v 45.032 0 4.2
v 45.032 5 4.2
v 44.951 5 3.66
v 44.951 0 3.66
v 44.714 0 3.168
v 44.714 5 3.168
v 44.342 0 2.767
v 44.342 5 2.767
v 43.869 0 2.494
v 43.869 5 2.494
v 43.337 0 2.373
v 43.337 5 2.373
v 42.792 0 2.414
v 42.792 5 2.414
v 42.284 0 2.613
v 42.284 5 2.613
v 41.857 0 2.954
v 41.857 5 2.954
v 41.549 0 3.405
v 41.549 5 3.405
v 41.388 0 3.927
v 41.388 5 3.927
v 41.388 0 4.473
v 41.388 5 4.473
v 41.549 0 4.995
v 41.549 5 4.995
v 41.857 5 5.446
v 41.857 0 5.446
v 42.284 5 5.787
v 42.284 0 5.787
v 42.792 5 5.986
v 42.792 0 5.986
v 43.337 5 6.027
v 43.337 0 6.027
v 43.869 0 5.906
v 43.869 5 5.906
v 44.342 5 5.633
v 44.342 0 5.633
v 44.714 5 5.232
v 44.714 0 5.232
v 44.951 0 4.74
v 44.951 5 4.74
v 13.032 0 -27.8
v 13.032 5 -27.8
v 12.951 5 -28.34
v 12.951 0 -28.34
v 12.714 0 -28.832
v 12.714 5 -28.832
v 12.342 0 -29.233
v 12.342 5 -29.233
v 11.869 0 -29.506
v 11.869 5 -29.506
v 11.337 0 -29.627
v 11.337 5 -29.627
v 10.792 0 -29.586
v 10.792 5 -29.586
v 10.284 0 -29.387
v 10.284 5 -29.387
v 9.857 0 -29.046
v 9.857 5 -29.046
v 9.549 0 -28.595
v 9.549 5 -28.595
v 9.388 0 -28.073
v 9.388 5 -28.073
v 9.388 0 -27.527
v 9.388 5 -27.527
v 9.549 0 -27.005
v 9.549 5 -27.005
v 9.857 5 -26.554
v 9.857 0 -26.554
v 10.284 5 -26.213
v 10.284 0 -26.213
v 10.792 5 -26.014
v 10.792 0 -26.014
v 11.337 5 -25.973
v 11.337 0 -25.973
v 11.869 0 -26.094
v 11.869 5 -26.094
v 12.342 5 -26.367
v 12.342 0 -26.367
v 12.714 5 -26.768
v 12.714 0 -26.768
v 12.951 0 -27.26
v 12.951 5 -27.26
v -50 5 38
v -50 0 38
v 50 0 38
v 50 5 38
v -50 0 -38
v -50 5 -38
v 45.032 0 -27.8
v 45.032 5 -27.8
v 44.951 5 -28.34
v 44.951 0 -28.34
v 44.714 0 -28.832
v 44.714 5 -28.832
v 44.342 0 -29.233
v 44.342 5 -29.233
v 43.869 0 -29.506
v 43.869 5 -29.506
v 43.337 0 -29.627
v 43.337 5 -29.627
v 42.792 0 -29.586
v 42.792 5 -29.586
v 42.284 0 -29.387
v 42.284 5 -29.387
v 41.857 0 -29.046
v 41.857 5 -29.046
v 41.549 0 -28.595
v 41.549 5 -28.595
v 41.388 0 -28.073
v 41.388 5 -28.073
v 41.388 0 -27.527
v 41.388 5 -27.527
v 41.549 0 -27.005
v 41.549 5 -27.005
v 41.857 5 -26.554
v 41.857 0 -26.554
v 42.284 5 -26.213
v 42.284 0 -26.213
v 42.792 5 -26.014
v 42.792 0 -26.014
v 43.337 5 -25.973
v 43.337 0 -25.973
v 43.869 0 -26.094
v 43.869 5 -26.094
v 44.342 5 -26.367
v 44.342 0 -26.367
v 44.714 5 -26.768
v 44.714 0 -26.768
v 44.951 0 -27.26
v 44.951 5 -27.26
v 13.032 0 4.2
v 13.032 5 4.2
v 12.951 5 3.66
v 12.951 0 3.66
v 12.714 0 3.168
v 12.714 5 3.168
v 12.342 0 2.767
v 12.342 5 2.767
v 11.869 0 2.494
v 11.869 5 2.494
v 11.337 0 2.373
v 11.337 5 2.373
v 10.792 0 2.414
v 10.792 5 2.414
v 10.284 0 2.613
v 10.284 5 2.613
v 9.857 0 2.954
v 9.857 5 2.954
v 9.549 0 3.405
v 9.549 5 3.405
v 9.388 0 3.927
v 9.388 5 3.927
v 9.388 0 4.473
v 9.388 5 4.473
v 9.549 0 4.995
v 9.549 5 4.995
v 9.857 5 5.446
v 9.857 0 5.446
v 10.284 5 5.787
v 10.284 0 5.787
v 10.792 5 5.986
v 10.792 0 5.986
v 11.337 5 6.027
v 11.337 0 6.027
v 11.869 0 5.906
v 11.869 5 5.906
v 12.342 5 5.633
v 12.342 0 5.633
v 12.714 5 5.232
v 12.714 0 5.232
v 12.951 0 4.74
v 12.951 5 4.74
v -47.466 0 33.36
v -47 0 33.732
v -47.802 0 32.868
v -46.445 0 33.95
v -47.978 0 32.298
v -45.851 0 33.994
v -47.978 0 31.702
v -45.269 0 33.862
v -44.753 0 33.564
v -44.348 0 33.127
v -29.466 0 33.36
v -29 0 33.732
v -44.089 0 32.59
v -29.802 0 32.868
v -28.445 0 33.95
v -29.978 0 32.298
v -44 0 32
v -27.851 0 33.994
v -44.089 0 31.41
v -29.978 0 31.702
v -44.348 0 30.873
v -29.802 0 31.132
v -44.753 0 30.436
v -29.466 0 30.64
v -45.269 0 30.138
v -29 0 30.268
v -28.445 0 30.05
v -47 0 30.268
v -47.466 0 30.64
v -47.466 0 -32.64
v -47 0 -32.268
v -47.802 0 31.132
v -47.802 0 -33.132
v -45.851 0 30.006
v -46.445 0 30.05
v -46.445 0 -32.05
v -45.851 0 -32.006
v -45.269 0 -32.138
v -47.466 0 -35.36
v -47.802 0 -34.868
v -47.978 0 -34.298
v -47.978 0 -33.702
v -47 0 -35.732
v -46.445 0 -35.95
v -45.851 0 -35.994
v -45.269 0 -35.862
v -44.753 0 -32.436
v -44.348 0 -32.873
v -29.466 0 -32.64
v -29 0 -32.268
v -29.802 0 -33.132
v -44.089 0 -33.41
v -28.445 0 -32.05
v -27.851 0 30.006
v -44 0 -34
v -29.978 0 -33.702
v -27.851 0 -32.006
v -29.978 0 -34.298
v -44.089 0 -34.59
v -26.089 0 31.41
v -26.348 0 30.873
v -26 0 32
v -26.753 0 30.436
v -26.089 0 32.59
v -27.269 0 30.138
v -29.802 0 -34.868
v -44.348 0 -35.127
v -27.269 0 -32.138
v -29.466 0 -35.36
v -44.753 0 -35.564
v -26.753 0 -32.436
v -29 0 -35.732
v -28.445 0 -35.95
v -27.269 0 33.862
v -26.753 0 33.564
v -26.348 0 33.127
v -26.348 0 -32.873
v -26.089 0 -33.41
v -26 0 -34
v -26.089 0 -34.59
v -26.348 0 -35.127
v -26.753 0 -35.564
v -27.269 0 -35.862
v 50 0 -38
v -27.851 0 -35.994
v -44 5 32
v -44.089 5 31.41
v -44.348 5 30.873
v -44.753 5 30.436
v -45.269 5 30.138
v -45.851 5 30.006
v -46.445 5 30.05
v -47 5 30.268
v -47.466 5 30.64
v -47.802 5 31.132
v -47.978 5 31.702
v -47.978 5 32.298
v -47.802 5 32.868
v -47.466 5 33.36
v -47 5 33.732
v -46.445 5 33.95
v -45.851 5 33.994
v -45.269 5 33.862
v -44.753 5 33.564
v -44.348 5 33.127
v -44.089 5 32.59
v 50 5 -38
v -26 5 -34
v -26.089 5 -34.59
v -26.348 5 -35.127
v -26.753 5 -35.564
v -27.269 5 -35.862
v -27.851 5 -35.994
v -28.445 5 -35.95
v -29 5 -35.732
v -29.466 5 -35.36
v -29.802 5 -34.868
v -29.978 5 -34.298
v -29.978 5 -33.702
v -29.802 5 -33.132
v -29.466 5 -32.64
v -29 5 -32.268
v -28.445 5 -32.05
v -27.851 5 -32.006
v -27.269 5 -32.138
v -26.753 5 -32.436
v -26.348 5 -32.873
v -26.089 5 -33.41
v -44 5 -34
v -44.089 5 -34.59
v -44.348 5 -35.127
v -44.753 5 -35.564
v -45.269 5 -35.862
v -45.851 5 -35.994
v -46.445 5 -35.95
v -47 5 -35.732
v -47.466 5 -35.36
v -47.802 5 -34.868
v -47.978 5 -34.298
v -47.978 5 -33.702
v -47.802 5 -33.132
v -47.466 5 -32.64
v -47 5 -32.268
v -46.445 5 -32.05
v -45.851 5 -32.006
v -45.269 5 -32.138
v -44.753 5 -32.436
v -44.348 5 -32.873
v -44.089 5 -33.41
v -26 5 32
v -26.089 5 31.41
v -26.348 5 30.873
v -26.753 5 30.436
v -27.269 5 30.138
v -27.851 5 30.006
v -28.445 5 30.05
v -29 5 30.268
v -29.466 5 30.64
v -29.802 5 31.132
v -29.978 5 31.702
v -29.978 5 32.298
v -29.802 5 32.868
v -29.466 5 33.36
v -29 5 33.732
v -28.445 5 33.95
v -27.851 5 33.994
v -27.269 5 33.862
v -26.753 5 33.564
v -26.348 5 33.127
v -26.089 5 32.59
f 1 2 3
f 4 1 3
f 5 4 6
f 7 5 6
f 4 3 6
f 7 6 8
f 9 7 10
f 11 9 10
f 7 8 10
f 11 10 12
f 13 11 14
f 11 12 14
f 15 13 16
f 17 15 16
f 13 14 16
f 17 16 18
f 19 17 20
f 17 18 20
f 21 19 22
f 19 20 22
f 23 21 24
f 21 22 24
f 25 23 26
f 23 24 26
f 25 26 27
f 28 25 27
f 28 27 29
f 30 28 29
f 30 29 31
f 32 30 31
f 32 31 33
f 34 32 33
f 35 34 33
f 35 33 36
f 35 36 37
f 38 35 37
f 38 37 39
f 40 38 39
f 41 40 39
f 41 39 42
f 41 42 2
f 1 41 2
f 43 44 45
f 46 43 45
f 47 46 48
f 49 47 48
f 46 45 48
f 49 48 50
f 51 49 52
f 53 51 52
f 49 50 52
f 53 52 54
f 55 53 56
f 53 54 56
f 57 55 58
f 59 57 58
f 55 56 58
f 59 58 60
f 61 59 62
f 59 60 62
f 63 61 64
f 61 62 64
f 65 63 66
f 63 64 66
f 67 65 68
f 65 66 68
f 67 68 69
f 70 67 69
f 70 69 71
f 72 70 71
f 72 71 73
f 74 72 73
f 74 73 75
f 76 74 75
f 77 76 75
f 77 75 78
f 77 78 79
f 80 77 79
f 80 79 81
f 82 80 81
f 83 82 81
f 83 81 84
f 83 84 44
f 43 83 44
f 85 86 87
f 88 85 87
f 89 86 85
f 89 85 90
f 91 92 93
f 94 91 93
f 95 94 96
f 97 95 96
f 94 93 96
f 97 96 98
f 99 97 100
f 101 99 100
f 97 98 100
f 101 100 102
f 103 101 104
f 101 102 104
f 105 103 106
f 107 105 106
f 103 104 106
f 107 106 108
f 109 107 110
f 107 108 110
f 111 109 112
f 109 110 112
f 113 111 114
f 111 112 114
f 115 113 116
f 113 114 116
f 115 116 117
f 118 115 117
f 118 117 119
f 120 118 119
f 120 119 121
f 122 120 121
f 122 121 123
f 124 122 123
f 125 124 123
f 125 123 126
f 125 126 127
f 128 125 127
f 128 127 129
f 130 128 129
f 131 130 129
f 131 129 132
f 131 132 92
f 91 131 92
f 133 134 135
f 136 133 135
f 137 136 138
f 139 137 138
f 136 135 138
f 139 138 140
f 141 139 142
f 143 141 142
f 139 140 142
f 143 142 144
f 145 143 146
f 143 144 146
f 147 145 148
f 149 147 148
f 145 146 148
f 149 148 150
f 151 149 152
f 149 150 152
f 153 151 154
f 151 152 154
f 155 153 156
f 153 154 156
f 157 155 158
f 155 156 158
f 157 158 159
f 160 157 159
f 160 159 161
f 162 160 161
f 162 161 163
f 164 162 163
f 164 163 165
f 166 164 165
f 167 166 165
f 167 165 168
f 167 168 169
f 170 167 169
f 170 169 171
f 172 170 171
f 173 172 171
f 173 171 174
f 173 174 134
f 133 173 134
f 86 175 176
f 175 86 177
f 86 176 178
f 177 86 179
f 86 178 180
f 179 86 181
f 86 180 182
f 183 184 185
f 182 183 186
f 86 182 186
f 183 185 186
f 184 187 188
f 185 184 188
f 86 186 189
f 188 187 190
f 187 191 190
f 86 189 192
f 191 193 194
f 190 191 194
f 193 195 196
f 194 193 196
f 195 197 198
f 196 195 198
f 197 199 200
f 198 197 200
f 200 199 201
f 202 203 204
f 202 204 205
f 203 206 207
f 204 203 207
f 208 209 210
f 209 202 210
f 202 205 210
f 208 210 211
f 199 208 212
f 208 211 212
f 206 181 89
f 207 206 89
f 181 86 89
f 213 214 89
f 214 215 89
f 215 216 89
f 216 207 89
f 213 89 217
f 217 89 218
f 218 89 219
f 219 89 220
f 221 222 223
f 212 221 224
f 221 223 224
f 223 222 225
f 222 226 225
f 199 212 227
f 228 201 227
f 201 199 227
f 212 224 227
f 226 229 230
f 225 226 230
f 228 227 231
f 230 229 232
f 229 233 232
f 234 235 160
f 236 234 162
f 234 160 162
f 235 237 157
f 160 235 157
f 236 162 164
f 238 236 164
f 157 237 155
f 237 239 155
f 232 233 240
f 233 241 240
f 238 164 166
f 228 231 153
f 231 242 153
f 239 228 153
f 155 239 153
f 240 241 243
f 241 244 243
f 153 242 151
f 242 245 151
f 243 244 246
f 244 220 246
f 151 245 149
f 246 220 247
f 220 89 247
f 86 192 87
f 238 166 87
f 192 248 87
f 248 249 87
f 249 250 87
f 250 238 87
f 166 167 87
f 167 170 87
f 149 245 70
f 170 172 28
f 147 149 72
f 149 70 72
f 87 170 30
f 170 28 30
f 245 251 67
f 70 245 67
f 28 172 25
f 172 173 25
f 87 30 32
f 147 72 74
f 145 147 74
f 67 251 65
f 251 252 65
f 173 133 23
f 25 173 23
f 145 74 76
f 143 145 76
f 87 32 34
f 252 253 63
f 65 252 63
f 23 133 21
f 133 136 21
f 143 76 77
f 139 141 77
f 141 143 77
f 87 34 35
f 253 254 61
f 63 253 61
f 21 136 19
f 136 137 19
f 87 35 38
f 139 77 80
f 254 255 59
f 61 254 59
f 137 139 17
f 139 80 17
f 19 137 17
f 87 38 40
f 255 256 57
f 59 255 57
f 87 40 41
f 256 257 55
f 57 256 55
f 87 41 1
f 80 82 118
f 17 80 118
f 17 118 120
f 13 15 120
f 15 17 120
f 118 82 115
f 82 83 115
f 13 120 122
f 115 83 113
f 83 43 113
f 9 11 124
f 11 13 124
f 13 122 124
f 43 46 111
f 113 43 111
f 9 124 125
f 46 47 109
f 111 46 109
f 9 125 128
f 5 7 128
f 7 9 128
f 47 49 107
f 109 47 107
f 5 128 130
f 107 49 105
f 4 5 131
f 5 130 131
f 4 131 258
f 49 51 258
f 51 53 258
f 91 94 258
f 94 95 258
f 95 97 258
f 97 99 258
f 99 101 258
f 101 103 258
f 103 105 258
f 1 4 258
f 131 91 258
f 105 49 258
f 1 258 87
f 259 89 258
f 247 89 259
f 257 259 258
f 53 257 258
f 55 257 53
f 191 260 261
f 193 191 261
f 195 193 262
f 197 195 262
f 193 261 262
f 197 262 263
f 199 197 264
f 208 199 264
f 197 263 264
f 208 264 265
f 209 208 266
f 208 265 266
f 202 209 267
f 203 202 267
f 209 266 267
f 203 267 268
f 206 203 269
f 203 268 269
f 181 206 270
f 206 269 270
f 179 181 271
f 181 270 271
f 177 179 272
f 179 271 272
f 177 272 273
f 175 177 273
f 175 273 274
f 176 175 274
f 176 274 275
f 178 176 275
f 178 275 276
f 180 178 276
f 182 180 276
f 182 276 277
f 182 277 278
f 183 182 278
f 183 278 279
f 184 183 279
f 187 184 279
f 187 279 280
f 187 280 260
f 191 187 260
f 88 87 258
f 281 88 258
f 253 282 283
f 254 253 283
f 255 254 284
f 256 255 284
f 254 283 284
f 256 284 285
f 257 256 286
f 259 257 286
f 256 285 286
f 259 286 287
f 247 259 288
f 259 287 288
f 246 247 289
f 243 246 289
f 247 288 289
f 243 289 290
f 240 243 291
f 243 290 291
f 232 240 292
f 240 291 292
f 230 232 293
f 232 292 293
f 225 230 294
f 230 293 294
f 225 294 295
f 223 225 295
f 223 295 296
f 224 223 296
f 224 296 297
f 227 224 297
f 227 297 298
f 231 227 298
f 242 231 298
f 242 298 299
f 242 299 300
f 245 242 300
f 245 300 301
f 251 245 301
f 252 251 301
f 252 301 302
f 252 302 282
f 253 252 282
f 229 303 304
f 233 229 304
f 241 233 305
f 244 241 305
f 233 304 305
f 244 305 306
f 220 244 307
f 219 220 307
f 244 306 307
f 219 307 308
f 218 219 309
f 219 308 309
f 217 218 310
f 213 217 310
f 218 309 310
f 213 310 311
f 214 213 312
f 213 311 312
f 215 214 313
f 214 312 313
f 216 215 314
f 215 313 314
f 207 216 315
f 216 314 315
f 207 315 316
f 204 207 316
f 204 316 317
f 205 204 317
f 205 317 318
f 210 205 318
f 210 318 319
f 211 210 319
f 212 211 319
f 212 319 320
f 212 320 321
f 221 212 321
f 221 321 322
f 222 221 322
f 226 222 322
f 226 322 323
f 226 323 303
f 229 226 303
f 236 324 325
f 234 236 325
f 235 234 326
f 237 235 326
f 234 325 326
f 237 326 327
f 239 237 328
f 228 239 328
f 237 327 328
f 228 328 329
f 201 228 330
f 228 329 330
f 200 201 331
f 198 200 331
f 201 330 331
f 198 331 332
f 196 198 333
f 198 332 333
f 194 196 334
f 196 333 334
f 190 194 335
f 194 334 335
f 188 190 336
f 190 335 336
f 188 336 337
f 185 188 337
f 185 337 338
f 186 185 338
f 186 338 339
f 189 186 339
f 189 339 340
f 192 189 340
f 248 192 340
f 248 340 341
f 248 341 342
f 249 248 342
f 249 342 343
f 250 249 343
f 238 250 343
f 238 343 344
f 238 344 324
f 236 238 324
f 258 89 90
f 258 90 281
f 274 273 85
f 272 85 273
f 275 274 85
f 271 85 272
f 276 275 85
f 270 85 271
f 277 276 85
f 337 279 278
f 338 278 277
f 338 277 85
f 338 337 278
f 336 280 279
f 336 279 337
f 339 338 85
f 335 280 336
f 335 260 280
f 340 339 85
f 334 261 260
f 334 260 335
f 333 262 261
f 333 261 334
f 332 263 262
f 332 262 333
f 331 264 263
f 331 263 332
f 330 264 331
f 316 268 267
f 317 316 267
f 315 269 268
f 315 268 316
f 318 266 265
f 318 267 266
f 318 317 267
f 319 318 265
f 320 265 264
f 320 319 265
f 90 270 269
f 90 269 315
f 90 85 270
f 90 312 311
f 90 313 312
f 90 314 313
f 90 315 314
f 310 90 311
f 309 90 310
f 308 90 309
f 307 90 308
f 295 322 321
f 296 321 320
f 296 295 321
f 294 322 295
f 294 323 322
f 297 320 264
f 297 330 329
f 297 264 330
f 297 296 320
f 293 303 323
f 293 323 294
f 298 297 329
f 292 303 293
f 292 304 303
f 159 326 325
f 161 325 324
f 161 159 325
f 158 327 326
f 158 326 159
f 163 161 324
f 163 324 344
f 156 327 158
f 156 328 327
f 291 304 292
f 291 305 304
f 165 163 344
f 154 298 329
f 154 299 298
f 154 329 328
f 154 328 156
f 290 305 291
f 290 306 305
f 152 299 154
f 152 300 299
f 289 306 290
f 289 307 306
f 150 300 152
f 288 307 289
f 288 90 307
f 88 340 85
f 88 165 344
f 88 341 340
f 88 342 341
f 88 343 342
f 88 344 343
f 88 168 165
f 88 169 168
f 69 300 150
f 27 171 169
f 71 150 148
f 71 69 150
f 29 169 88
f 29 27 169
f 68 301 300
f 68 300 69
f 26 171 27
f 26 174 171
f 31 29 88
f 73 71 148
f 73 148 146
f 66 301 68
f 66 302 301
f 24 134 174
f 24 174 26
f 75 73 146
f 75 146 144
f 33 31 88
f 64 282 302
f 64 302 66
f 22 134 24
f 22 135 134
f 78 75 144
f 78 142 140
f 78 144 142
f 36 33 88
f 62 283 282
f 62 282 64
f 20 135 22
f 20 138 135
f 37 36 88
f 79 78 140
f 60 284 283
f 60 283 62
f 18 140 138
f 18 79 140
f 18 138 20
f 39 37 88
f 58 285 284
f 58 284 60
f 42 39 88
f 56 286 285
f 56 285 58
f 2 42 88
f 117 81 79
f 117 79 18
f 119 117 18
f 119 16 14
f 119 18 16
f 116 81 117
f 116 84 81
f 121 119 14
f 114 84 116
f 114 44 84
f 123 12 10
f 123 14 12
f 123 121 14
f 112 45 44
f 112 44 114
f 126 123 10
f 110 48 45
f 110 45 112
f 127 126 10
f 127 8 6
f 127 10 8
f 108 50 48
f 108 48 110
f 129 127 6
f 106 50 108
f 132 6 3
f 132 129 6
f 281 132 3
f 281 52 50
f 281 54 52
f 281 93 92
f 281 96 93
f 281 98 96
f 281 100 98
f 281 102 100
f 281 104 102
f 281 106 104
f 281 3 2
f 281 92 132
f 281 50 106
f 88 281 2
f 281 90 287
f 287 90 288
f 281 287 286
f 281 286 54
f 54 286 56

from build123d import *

# Parameters (mm, degrees)
SKETCH1_W           = 100
SKETCH1_H           = 76
BOSS_EXTRUDE1_DEPTH = 5
CUT_EXTRUDE6_REACH  = 7
SKETCH2_R           = 2
SKETCH2_R_2         = 1.832419899


with BuildPart() as part:
    # Sketch1 → Boss-Extrude1 (new body)
    with BuildSketch(Plane(origin=(0, 0, 0), x_dir=(1, 0, 0), z_dir=(0, 1, 0))):
        Rectangle(SKETCH1_W, SKETCH1_H)
    extrude(amount=BOSS_EXTRUDE1_DEPTH)

    # Sketch2 → Cut-Extrude6 (cut, up to next)
    with BuildSketch(Plane(origin=(0, 5, 0), x_dir=(1, 0, 0), z_dir=(0, 1, 0)), mode=Mode.PRIVATE) as cut_extrude6_sk1:
        with Locations((-46, 34)):
            Circle(SKETCH2_R)
    cut_extrude6_tool1 = extrude(cut_extrude6_sk1.sketch, amount=-CUT_EXTRUDE6_REACH, mode=Mode.PRIVATE) & part.part
    add(cut_extrude6_tool1.solids().sort_by_distance((-46, 5, -34))[0], mode=Mode.SUBTRACT)
    # Sketch2 → Cut-Extrude6 (cut, up to next)
    with BuildSketch(Plane(origin=(0, 5, 0), x_dir=(1, 0, 0), z_dir=(0, 1, 0)), mode=Mode.PRIVATE) as cut_extrude6_sk2:
        with Locations((-28, 34)):
            Circle(SKETCH2_R)
    cut_extrude6_tool2 = extrude(cut_extrude6_sk2.sketch, amount=-CUT_EXTRUDE6_REACH, mode=Mode.PRIVATE) & part.part
    add(cut_extrude6_tool2.solids().sort_by_distance((-28, 5, -34))[0], mode=Mode.SUBTRACT)
    # Sketch2 → Cut-Extrude6 (cut, up to next)
    with BuildSketch(Plane(origin=(0, 5, 0), x_dir=(1, 0, 0), z_dir=(0, 1, 0)), mode=Mode.PRIVATE) as cut_extrude6_sk3:
        with Locations((-46, -32)):
            Circle(SKETCH2_R)
    cut_extrude6_tool3 = extrude(cut_extrude6_sk3.sketch, amount=-CUT_EXTRUDE6_REACH, mode=Mode.PRIVATE) & part.part
    add(cut_extrude6_tool3.solids().sort_by_distance((-46, 5, 32))[0], mode=Mode.SUBTRACT)
    # Sketch2 → Cut-Extrude6 (cut, up to next)
    with BuildSketch(Plane(origin=(0, 5, 0), x_dir=(1, 0, 0), z_dir=(0, 1, 0)), mode=Mode.PRIVATE) as cut_extrude6_sk4:
        with Locations((-28, -32)):
            Circle(SKETCH2_R)
    cut_extrude6_tool4 = extrude(cut_extrude6_sk4.sketch, amount=-CUT_EXTRUDE6_REACH, mode=Mode.PRIVATE) & part.part
    add(cut_extrude6_tool4.solids().sort_by_distance((-28, 5, 32))[0], mode=Mode.SUBTRACT)
    # Sketch2 → Cut-Extrude6 (cut, up to next)
    with BuildSketch(Plane(origin=(0, 5, 0), x_dir=(1, 0, 0), z_dir=(0, 1, 0)), mode=Mode.PRIVATE) as cut_extrude6_sk5:
        with Locations((11.2, 27.8)):
            Circle(SKETCH2_R_2)
    cut_extrude6_tool5 = extrude(cut_extrude6_sk5.sketch, amount=-CUT_EXTRUDE6_REACH, mode=Mode.PRIVATE) & part.part
    add(cut_extrude6_tool5.solids().sort_by_distance((11.2, 5, -27.8))[0], mode=Mode.SUBTRACT)
    # Sketch2 → Cut-Extrude6 (cut, up to next)
    with BuildSketch(Plane(origin=(0, 5, 0), x_dir=(1, 0, 0), z_dir=(0, 1, 0)), mode=Mode.PRIVATE) as cut_extrude6_sk6:
        with Locations((43.2, 27.8)):
            Circle(SKETCH2_R_2)
    cut_extrude6_tool6 = extrude(cut_extrude6_sk6.sketch, amount=-CUT_EXTRUDE6_REACH, mode=Mode.PRIVATE) & part.part
    add(cut_extrude6_tool6.solids().sort_by_distance((43.2, 5, -27.8))[0], mode=Mode.SUBTRACT)
    # Sketch2 → Cut-Extrude6 (cut, up to next)
    with BuildSketch(Plane(origin=(0, 5, 0), x_dir=(1, 0, 0), z_dir=(0, 1, 0)), mode=Mode.PRIVATE) as cut_extrude6_sk7:
        with Locations((11.2, -4.2)):
            Circle(SKETCH2_R_2)
    cut_extrude6_tool7 = extrude(cut_extrude6_sk7.sketch, amount=-CUT_EXTRUDE6_REACH, mode=Mode.PRIVATE) & part.part
    add(cut_extrude6_tool7.solids().sort_by_distance((11.2, 5, 4.2))[0], mode=Mode.SUBTRACT)
    # Sketch2 → Cut-Extrude6 (cut, up to next)
    with BuildSketch(Plane(origin=(0, 5, 0), x_dir=(1, 0, 0), z_dir=(0, 1, 0)), mode=Mode.PRIVATE) as cut_extrude6_sk8:
        with Locations((43.2, -4.2)):
            Circle(SKETCH2_R_2)
    cut_extrude6_tool8 = extrude(cut_extrude6_sk8.sketch, amount=-CUT_EXTRUDE6_REACH, mode=Mode.PRIVATE) & part.part
    add(cut_extrude6_tool8.solids().sort_by_distance((43.2, 5, 4.2))[0], mode=Mode.SUBTRACT)


solid = part.part
